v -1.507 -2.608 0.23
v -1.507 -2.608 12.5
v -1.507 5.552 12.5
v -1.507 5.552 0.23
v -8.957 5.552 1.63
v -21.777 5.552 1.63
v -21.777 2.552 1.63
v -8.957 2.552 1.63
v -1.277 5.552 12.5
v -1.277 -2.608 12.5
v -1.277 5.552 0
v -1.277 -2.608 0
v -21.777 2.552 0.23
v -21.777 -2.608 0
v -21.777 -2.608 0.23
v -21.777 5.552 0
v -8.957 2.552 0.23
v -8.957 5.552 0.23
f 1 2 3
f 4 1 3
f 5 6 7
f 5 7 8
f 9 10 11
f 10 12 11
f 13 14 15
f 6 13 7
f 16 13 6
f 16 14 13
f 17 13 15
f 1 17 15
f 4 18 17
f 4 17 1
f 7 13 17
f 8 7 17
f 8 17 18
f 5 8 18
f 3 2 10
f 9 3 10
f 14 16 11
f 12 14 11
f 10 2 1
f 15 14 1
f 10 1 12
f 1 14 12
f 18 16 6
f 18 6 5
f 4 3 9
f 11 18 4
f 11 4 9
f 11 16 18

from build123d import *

# Parameters (mm, degrees)
SKETCH_1_W      = 20.5
SKETCH_1_H      = 8.16
EXTRUDE_1_DEPTH = 0.23
SKETCH_2_W      = 12.82
SKETCH_2_H      = 3
EXTRUDE_2_DEPTH = 1.4
SKETCH_3_W      = 0.23
SKETCH_3_H      = 8.16
EXTRUDE_3_DEPTH = 12.27


with BuildPart() as part:
    # 草图1 → 凸台-拉伸1 (new body)
    with BuildSketch(Plane.XY):
        with Locations((-11.527217391, 1.472347826)):
            Rectangle(SKETCH_1_W, SKETCH_1_H)
    extrude(amount=EXTRUDE_1_DEPTH)

    # 草图2 → 凸台-拉伸2 (add)
    with BuildSketch(Plane.XY.offset(0.23)):
        with Locations((-15.367217391, 4.052347826)):
            Rectangle(SKETCH_2_W, SKETCH_2_H)
    extrude(amount=EXTRUDE_2_DEPTH)

    # 草图3 → 凸台-拉伸3 (add)
    with BuildSketch(Plane.XY.offset(0.23)):
        with Locations((-1.392217391, 1.472347826)):
            Rectangle(SKETCH_3_W, SKETCH_3_H)
    extrude(amount=EXTRUDE_3_DEPTH)


solid = part.part
